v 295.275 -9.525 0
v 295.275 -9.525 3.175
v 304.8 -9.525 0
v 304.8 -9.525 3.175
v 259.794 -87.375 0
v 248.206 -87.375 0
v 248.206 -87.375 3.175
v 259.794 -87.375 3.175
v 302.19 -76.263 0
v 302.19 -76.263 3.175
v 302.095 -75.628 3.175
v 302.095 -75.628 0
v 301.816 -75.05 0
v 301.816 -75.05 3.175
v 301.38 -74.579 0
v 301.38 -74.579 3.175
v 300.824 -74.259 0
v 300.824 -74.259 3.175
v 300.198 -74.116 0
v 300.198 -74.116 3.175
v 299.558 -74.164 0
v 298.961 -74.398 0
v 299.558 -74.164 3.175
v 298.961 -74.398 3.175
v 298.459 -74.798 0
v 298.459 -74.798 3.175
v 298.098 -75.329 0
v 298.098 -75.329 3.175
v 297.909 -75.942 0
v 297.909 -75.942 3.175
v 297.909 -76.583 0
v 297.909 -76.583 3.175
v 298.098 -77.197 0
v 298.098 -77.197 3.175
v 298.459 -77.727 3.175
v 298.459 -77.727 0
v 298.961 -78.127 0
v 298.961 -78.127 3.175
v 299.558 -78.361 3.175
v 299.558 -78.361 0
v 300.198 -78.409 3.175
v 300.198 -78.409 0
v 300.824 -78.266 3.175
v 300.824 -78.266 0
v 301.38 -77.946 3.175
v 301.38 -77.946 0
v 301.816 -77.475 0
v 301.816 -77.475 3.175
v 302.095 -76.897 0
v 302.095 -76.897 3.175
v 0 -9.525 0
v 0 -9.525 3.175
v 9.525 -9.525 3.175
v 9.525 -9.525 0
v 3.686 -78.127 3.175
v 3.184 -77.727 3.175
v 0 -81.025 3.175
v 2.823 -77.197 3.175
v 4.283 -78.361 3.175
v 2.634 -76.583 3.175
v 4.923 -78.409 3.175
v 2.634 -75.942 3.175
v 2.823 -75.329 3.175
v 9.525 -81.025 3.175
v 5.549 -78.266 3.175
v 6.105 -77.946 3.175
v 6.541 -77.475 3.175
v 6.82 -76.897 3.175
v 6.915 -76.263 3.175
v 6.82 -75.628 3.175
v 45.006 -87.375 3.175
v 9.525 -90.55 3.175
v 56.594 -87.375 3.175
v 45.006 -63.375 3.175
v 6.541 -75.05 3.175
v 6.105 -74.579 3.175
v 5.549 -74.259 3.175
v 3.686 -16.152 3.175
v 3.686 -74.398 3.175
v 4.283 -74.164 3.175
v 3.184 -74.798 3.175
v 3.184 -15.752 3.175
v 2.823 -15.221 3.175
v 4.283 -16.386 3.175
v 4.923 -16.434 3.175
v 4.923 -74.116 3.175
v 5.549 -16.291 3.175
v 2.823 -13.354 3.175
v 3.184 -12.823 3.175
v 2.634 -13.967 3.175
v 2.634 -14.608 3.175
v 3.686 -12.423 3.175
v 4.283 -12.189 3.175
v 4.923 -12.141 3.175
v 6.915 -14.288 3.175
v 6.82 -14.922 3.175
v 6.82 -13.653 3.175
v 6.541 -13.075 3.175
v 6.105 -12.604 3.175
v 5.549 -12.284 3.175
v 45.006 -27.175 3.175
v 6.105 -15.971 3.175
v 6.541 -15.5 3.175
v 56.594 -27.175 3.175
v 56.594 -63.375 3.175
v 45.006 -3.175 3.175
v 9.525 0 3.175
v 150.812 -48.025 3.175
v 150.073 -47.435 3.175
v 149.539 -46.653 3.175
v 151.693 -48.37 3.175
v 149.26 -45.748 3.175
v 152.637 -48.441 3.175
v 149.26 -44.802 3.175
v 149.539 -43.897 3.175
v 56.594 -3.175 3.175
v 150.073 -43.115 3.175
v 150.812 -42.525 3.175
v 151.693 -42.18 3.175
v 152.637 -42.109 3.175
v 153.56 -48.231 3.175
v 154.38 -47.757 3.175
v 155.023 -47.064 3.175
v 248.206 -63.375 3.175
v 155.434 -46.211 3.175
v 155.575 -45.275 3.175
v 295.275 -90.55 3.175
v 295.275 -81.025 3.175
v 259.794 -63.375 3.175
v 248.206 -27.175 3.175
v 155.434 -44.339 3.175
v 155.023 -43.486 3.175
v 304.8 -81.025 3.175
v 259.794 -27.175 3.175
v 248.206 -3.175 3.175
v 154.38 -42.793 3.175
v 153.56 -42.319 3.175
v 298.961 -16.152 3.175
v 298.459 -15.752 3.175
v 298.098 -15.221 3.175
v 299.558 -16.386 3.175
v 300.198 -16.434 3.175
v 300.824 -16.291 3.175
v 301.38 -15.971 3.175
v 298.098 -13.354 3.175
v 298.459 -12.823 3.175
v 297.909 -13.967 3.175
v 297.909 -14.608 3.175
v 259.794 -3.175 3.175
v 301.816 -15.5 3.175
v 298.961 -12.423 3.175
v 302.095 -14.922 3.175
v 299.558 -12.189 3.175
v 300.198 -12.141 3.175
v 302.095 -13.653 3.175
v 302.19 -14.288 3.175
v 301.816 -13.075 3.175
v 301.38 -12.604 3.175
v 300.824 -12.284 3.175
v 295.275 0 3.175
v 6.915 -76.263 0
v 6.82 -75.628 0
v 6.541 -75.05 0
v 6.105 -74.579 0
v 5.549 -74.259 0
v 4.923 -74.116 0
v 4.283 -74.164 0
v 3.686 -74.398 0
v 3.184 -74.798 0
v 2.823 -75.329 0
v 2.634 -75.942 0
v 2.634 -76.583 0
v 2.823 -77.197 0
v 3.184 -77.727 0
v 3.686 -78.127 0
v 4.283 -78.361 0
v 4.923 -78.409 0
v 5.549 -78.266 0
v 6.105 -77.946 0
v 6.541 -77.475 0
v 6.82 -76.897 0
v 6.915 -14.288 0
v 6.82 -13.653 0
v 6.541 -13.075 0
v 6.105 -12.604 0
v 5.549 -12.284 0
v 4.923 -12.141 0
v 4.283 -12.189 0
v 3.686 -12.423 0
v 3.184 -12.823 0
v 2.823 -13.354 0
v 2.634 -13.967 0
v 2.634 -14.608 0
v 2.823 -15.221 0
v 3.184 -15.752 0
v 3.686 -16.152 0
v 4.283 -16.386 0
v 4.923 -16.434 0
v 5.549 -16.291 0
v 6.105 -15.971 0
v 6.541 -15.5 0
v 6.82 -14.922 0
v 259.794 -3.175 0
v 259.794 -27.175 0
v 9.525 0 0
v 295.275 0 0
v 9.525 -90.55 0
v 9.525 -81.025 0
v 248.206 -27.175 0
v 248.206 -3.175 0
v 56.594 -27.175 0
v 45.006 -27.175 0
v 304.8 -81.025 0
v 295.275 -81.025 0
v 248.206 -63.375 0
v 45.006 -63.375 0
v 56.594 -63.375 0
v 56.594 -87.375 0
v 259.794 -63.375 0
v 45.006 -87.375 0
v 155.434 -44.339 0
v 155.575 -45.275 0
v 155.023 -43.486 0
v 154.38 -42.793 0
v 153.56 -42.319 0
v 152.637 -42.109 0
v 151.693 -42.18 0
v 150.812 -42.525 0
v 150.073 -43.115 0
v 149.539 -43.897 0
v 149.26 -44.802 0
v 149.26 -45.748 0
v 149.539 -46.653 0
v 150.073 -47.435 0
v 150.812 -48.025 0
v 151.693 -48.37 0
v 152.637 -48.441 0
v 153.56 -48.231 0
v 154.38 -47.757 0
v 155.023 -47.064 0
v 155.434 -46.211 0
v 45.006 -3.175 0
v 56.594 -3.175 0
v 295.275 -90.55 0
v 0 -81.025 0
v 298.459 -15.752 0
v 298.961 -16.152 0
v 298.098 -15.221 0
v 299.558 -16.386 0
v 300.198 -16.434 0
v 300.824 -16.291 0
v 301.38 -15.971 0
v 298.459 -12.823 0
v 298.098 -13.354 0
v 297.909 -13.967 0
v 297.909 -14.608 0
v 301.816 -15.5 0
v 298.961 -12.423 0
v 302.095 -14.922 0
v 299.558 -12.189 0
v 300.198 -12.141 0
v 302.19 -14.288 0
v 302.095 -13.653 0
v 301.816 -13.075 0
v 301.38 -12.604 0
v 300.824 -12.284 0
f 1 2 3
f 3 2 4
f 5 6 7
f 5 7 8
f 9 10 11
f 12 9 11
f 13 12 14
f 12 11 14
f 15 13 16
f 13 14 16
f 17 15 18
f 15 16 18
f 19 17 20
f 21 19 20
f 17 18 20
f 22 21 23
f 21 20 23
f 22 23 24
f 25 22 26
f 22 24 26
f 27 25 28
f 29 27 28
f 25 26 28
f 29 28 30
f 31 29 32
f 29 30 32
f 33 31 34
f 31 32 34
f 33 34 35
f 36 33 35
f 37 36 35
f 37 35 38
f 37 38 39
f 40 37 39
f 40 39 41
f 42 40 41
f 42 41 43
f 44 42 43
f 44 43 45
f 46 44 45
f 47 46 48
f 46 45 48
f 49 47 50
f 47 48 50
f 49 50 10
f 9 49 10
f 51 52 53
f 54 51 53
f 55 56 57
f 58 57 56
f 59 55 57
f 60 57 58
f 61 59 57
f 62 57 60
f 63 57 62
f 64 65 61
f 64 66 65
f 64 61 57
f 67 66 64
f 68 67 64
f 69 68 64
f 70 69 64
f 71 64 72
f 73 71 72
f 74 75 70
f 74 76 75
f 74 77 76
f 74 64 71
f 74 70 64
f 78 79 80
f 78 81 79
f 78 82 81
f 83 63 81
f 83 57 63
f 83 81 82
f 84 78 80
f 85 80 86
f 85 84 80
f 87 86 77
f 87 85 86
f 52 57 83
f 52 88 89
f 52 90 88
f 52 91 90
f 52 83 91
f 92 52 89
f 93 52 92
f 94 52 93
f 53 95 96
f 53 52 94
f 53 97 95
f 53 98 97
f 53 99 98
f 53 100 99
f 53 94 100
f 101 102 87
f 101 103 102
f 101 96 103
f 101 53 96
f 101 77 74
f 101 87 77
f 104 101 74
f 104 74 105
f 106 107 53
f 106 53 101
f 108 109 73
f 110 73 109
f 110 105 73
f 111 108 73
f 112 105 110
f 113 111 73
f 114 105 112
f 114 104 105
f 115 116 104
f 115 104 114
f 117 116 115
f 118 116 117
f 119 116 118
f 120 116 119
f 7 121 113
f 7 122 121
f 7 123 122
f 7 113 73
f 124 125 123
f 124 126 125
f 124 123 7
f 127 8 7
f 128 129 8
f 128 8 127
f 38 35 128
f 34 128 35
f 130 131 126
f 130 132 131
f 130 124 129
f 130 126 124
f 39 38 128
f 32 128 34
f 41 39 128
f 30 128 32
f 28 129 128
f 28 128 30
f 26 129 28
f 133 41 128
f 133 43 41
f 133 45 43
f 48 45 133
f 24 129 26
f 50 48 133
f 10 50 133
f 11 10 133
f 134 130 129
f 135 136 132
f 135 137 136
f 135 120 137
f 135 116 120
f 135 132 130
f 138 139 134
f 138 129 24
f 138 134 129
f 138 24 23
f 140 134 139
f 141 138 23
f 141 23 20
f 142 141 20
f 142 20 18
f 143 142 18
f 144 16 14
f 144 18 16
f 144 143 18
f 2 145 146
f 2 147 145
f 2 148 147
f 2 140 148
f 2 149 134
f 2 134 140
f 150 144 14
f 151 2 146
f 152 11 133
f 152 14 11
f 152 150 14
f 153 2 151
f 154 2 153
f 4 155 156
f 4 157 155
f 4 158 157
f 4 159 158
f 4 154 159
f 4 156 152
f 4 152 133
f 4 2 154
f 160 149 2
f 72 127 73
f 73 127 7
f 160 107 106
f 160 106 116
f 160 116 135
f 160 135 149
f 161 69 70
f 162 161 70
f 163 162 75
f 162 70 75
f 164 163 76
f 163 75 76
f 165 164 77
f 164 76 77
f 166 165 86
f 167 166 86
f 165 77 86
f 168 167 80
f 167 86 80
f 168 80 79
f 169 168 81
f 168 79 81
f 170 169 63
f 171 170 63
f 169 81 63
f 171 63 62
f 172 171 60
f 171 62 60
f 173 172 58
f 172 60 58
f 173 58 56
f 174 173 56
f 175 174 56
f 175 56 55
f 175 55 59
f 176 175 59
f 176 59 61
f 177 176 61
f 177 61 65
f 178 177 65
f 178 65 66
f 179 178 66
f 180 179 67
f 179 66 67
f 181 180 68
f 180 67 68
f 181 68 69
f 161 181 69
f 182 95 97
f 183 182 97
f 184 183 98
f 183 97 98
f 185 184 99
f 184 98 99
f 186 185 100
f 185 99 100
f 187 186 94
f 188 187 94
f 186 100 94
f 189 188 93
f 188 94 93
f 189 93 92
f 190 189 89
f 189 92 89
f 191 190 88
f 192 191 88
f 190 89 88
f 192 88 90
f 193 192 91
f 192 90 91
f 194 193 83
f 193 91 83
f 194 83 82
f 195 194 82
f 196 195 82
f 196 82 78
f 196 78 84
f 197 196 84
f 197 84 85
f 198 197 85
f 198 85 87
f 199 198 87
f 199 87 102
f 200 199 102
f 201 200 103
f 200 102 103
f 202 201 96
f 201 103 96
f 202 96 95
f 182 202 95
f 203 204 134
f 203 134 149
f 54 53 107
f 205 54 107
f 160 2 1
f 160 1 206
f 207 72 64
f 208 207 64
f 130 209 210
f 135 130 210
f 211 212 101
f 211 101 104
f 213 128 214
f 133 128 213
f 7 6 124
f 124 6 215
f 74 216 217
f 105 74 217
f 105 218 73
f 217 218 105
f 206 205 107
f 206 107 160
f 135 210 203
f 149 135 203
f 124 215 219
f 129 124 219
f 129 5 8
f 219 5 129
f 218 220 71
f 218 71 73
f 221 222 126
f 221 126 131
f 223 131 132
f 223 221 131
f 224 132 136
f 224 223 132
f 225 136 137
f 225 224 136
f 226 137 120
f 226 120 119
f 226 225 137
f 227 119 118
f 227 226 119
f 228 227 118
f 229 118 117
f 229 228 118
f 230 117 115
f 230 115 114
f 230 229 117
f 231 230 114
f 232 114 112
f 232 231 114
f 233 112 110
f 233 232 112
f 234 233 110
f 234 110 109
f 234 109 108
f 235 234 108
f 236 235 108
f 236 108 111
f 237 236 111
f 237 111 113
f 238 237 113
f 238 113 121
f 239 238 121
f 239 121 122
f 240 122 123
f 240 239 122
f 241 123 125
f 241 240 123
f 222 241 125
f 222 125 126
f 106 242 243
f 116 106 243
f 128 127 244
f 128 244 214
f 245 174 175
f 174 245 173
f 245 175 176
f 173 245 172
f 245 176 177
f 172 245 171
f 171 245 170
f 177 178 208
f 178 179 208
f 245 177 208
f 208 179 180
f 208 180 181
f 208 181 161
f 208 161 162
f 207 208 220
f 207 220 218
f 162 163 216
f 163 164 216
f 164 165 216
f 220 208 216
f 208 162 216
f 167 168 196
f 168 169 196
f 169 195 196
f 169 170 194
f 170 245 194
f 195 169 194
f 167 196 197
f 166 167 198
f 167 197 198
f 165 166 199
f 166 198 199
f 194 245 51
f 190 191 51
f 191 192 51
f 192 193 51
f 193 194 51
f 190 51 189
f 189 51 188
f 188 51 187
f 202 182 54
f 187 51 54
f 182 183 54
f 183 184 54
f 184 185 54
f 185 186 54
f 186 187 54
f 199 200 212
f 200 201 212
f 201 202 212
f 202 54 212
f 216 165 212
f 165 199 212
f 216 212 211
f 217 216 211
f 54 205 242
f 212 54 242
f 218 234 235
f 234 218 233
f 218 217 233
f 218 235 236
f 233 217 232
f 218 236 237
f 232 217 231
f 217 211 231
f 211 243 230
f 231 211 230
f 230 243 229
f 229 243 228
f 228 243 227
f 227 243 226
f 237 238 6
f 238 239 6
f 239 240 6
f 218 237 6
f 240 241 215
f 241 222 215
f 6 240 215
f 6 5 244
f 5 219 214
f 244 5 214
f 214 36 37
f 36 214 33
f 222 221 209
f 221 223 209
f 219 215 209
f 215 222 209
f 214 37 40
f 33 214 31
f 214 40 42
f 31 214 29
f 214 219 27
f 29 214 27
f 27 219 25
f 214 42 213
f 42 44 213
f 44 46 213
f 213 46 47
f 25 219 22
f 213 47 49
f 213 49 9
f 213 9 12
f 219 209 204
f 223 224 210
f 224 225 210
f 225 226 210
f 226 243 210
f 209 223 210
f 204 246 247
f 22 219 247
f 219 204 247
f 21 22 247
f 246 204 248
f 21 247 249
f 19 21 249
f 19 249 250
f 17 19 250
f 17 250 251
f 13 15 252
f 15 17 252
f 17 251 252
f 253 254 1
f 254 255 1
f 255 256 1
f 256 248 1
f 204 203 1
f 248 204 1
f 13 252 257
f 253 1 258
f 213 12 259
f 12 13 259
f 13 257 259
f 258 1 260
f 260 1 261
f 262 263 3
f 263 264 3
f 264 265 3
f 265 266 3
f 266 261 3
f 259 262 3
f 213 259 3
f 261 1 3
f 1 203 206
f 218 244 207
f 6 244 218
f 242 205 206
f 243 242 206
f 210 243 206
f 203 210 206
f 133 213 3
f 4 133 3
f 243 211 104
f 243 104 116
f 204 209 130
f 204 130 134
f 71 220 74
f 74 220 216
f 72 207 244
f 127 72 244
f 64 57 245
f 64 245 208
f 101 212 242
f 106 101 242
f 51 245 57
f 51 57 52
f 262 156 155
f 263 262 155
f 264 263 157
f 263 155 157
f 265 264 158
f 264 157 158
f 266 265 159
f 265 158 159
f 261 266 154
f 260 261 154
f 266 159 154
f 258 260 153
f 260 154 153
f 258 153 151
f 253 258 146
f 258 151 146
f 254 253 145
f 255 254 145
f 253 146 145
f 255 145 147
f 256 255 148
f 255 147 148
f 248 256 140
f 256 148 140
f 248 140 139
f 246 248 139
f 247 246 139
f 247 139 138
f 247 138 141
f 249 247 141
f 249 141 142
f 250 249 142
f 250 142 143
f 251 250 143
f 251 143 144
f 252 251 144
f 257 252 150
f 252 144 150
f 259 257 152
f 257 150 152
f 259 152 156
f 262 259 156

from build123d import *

# Parameters (mm, degrees)
F0_W     = 304.8
F0_H     = 90.5500094
F0_W_2   = 11.5876832
F0_H_2   = 24
F0_R     = 3.175
F1_DEPTH = 3.175
F2_R     = 2.15265
F3_DEPTH = 3.175
F4_W     = 9.525
F4_H     = 9.525
F5_DEPTH = 3.175


with BuildPart() as f1:
    # F0 (on Top) → F1 (new body)
    with BuildSketch(Plane.XY):
        with Locations((152.4, -45.2750047)):
            Rectangle(F0_W, F0_H)
        with Locations((50.8, -75.3750094)):
            Rectangle(F0_W_2, F0_H_2, mode=Mode.SUBTRACT)
        with Locations((254, -75.3750094)):
            Rectangle(F0_W_2, F0_H_2, mode=Mode.SUBTRACT)
        with Locations((50.8, -15.175)):
            Rectangle(F0_W_2, F0_H_2, mode=Mode.SUBTRACT)
        with Locations((152.4, -45.2750047)):
            Circle(F0_R, mode=Mode.SUBTRACT)
        with Locations((254, -15.175)):
            Rectangle(F0_W_2, F0_H_2, mode=Mode.SUBTRACT)
    extrude(amount=F1_DEPTH)

    # F2 (on face) → F3 (cut, through all)
    with BuildSketch(Plane.XY.offset(3.175)):
        with Locations((4.7625, -14.2875)):
            Circle(F2_R)
        with Locations((4.7625, -76.2625094)):
            Circle(F2_R)
        with Locations((300.0375, -76.2625094)):
            Circle(F2_R)
        with Locations((300.0375, -14.2875)):
            Circle(F2_R)
    extrude(amount=-F3_DEPTH, mode=Mode.SUBTRACT)

    # F4 (on face) → F5 (cut, through all)
    with BuildSketch(Plane.XY.offset(3.175)):
        with Locations((300.0375, -4.7625)):
            Rectangle(F4_W, F4_H)
        with Locations((300.0375, -85.7875094)):
            Rectangle(F4_W, F4_H)
        with Locations((4.7625, -85.7875094)):
            Rectangle(F4_W, F4_H)
        with Locations((4.7625, -4.7625)):
            Rectangle(F4_W, F4_H)
    extrude(amount=-F5_DEPTH, mode=Mode.SUBTRACT)


solid = f1.part
